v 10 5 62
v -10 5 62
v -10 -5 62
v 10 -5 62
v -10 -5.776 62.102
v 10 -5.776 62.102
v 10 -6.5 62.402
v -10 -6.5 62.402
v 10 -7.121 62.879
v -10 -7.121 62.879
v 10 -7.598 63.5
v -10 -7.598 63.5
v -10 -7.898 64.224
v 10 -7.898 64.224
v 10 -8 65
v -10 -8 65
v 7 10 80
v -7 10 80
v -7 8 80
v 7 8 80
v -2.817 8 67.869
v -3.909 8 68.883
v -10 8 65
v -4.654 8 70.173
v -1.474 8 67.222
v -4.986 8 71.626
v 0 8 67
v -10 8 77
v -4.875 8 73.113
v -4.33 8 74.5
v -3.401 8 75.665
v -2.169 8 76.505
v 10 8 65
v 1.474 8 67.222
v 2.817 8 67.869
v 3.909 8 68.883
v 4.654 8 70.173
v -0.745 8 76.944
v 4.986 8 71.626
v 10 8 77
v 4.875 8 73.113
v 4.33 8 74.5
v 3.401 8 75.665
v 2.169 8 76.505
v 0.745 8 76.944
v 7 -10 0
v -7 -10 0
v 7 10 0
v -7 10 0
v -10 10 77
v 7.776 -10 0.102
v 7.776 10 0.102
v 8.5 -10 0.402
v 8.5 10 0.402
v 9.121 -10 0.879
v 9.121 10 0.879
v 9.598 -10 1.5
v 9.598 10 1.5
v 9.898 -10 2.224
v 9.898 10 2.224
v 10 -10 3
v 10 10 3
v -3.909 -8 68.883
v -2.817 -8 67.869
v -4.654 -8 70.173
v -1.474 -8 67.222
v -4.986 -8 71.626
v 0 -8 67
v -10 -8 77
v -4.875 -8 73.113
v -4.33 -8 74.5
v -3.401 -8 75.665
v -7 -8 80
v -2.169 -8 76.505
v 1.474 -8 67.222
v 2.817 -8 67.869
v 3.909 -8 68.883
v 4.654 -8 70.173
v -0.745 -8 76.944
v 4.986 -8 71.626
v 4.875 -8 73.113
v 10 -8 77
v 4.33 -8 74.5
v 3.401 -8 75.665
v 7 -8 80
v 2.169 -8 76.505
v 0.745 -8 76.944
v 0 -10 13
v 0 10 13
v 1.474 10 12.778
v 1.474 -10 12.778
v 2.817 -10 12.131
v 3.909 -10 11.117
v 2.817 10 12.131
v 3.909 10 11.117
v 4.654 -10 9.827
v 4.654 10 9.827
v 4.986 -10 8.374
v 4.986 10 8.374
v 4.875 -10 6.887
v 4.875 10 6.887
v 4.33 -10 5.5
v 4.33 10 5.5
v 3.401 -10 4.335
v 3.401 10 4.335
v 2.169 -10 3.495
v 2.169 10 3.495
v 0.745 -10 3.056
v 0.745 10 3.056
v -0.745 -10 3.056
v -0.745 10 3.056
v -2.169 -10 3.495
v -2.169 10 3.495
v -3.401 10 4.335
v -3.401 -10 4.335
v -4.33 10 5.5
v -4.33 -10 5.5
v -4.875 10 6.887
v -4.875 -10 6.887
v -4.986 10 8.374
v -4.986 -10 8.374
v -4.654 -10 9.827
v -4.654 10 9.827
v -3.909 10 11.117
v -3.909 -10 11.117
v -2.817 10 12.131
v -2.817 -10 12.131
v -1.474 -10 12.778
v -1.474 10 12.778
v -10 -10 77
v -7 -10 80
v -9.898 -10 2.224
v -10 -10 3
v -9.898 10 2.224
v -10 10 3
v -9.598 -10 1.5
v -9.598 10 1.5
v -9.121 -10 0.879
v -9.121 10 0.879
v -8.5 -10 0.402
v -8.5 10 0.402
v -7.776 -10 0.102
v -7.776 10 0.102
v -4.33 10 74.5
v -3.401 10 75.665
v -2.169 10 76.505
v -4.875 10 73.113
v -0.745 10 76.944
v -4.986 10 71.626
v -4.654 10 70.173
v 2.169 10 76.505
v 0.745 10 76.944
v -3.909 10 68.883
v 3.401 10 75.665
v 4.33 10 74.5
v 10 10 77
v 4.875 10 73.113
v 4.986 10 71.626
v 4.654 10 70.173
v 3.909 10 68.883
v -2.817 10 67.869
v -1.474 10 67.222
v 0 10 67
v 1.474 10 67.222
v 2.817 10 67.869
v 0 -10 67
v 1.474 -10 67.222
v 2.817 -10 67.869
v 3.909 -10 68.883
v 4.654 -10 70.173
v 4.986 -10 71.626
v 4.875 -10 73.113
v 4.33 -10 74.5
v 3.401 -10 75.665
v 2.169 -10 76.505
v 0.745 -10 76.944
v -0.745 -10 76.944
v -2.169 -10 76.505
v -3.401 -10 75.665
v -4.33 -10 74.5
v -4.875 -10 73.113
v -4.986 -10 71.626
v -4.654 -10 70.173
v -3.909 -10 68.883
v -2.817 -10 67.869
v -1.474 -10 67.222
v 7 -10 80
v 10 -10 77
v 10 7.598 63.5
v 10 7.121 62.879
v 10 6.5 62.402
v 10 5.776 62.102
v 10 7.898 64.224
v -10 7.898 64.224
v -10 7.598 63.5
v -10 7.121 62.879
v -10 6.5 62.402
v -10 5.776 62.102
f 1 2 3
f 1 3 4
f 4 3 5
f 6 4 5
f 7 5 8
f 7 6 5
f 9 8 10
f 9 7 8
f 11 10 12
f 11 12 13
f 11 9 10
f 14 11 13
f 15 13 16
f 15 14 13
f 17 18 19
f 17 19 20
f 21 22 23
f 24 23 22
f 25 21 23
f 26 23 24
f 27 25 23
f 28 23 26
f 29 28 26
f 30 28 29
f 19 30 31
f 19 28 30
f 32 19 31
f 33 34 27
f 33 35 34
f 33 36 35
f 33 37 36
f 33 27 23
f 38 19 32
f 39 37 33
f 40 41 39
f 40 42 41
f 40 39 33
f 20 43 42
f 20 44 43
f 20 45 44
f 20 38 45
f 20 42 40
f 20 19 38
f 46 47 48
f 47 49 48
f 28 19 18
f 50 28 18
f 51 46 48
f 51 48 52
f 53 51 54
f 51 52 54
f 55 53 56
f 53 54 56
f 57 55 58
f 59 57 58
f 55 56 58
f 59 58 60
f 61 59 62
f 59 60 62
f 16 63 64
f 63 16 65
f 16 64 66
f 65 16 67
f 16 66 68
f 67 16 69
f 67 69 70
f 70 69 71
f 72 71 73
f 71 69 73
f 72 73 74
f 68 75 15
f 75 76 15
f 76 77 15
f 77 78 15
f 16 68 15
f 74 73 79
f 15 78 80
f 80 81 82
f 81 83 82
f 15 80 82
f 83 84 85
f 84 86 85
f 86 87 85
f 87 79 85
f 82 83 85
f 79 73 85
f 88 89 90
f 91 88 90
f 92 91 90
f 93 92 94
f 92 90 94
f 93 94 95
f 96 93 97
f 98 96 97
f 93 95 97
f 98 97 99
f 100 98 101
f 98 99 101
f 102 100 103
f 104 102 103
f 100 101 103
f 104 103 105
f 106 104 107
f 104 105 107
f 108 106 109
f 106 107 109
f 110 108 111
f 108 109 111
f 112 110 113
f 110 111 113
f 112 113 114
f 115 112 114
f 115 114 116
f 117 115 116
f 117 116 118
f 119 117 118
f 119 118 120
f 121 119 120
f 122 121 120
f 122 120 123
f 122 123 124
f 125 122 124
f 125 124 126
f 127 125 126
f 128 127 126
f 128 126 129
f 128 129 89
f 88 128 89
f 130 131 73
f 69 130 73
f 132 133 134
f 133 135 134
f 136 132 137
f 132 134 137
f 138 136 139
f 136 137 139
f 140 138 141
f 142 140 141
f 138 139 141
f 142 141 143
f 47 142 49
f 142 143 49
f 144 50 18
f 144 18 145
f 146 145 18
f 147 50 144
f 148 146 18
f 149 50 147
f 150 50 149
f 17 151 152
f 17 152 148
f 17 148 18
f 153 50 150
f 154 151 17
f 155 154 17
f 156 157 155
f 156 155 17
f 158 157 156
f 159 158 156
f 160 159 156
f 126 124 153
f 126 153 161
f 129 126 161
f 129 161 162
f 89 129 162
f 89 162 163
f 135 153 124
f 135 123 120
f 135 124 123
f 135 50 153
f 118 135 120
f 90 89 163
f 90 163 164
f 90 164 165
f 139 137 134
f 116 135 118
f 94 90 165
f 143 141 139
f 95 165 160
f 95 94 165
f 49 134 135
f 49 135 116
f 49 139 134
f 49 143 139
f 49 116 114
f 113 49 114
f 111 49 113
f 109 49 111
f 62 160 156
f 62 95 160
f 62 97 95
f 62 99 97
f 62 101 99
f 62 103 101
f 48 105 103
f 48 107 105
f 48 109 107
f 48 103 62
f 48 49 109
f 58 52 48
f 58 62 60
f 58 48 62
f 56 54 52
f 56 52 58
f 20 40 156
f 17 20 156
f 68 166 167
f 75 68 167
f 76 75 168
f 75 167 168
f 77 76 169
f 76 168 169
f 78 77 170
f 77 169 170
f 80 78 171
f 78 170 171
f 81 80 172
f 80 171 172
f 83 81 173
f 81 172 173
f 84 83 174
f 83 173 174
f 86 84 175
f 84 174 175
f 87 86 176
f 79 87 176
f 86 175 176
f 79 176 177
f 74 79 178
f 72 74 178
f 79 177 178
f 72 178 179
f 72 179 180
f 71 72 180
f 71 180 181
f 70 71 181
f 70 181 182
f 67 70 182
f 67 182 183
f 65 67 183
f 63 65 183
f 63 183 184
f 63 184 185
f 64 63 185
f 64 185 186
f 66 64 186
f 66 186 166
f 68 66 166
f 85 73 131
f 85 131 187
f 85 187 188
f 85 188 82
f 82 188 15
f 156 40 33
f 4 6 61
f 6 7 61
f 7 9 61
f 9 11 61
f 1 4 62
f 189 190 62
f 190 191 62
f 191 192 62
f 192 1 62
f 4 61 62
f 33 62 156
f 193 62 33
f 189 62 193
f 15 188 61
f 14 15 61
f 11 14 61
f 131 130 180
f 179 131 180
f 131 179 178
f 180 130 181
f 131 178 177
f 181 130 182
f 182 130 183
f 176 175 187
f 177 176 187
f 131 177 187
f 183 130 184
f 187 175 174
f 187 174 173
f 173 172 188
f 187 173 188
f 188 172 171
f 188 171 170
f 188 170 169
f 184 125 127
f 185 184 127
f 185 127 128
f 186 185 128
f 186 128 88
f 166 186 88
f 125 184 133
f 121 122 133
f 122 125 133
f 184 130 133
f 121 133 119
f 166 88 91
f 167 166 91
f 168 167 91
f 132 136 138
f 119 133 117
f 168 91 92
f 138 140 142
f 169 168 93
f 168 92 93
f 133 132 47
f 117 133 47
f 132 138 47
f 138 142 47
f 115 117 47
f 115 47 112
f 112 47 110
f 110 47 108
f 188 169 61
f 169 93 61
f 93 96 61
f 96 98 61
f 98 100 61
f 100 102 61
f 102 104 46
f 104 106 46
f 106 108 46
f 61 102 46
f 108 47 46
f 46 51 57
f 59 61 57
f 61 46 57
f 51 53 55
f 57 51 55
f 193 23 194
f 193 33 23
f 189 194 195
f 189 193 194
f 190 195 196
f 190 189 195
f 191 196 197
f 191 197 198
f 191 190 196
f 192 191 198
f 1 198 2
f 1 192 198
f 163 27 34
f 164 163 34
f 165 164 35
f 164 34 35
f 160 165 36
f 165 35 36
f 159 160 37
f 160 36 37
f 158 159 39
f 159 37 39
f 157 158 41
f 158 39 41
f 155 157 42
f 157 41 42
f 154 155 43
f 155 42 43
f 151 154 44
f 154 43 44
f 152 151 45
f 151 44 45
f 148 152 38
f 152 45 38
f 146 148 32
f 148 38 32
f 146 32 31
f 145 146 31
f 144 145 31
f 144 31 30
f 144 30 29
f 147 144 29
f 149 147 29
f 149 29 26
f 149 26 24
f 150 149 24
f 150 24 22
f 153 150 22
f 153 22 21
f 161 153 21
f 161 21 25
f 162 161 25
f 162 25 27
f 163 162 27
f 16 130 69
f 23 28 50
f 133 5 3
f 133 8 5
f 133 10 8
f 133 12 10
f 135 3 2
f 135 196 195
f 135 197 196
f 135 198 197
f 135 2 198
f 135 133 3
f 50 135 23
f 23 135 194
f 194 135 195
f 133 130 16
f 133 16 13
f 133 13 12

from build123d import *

# Parameters (mm, degrees)
SKETCH1_W           = 20
SKETCH1_H           = 20
BOSS_EXTRUDE1_DEPTH = 80
SKETCH2_R           = 5
CUT_EXTRUDE1_DEPTH  = 80
SKETCH3_W           = 20
SKETCH3_H           = 16
CUT_EXTRUDE2_DEPTH  = 18
SKETCH4_R           = 5
CUT_EXTRUDE3_DEPTH  = 92
FILLET1_R           = 3
CHAMFER1_SIZE       = 3


with BuildPart() as part:
    # Sketch1 → Boss-Extrude1 (new body)
    with BuildSketch(Plane.XY):
        Rectangle(SKETCH1_W, SKETCH1_H)
    extrude(amount=BOSS_EXTRUDE1_DEPTH)

    # Sketch2 → Cut-Extrude1 (cut)
    with BuildSketch(Plane(origin=(0, 10, 0), x_dir=(1, 0, 0), z_dir=(0, 1, 0))):
        with Locations(Location((0, -8, 0), (0, 0, 270))):
            Circle(SKETCH2_R)
    extrude(amount=-CUT_EXTRUDE1_DEPTH, mode=Mode.SUBTRACT)

    # Sketch3 → Cut-Extrude2 (cut)
    with BuildSketch(Plane.XY.offset(80)):
        Rectangle(SKETCH3_W, SKETCH3_H)
    extrude(amount=-CUT_EXTRUDE2_DEPTH, mode=Mode.SUBTRACT)

    # Sketch4 → Cut-Extrude3 (cut)
    with BuildSketch(Plane.XZ.offset(10)):
        with Locations(Location((0, 72, 0), (0, 0, 270))):
            Circle(SKETCH4_R)
    extrude(amount=-CUT_EXTRUDE3_DEPTH, mode=Mode.SUBTRACT)

    # Fillet1
    fillet1_edges = [part.edges().sort_by_distance(p)[0] for p in [
        (0, 8, 62),
        (0, -8, 62),
        (-10, 0, 0),
        (10, 0, 0),
    ]]
    fillet(fillet1_edges, radius=FILLET1_R)

    # Chamfer1
    chamfer1_edges = [part.edges().sort_by_distance(p)[0] for p in [
        (-10, 9, 80),
        (10, 9, 80),
        (-10, -9, 80),
        (10, -9, 80),
    ]]
    chamfer(chamfer1_edges, length=CHAMFER1_SIZE)


solid = part.part
